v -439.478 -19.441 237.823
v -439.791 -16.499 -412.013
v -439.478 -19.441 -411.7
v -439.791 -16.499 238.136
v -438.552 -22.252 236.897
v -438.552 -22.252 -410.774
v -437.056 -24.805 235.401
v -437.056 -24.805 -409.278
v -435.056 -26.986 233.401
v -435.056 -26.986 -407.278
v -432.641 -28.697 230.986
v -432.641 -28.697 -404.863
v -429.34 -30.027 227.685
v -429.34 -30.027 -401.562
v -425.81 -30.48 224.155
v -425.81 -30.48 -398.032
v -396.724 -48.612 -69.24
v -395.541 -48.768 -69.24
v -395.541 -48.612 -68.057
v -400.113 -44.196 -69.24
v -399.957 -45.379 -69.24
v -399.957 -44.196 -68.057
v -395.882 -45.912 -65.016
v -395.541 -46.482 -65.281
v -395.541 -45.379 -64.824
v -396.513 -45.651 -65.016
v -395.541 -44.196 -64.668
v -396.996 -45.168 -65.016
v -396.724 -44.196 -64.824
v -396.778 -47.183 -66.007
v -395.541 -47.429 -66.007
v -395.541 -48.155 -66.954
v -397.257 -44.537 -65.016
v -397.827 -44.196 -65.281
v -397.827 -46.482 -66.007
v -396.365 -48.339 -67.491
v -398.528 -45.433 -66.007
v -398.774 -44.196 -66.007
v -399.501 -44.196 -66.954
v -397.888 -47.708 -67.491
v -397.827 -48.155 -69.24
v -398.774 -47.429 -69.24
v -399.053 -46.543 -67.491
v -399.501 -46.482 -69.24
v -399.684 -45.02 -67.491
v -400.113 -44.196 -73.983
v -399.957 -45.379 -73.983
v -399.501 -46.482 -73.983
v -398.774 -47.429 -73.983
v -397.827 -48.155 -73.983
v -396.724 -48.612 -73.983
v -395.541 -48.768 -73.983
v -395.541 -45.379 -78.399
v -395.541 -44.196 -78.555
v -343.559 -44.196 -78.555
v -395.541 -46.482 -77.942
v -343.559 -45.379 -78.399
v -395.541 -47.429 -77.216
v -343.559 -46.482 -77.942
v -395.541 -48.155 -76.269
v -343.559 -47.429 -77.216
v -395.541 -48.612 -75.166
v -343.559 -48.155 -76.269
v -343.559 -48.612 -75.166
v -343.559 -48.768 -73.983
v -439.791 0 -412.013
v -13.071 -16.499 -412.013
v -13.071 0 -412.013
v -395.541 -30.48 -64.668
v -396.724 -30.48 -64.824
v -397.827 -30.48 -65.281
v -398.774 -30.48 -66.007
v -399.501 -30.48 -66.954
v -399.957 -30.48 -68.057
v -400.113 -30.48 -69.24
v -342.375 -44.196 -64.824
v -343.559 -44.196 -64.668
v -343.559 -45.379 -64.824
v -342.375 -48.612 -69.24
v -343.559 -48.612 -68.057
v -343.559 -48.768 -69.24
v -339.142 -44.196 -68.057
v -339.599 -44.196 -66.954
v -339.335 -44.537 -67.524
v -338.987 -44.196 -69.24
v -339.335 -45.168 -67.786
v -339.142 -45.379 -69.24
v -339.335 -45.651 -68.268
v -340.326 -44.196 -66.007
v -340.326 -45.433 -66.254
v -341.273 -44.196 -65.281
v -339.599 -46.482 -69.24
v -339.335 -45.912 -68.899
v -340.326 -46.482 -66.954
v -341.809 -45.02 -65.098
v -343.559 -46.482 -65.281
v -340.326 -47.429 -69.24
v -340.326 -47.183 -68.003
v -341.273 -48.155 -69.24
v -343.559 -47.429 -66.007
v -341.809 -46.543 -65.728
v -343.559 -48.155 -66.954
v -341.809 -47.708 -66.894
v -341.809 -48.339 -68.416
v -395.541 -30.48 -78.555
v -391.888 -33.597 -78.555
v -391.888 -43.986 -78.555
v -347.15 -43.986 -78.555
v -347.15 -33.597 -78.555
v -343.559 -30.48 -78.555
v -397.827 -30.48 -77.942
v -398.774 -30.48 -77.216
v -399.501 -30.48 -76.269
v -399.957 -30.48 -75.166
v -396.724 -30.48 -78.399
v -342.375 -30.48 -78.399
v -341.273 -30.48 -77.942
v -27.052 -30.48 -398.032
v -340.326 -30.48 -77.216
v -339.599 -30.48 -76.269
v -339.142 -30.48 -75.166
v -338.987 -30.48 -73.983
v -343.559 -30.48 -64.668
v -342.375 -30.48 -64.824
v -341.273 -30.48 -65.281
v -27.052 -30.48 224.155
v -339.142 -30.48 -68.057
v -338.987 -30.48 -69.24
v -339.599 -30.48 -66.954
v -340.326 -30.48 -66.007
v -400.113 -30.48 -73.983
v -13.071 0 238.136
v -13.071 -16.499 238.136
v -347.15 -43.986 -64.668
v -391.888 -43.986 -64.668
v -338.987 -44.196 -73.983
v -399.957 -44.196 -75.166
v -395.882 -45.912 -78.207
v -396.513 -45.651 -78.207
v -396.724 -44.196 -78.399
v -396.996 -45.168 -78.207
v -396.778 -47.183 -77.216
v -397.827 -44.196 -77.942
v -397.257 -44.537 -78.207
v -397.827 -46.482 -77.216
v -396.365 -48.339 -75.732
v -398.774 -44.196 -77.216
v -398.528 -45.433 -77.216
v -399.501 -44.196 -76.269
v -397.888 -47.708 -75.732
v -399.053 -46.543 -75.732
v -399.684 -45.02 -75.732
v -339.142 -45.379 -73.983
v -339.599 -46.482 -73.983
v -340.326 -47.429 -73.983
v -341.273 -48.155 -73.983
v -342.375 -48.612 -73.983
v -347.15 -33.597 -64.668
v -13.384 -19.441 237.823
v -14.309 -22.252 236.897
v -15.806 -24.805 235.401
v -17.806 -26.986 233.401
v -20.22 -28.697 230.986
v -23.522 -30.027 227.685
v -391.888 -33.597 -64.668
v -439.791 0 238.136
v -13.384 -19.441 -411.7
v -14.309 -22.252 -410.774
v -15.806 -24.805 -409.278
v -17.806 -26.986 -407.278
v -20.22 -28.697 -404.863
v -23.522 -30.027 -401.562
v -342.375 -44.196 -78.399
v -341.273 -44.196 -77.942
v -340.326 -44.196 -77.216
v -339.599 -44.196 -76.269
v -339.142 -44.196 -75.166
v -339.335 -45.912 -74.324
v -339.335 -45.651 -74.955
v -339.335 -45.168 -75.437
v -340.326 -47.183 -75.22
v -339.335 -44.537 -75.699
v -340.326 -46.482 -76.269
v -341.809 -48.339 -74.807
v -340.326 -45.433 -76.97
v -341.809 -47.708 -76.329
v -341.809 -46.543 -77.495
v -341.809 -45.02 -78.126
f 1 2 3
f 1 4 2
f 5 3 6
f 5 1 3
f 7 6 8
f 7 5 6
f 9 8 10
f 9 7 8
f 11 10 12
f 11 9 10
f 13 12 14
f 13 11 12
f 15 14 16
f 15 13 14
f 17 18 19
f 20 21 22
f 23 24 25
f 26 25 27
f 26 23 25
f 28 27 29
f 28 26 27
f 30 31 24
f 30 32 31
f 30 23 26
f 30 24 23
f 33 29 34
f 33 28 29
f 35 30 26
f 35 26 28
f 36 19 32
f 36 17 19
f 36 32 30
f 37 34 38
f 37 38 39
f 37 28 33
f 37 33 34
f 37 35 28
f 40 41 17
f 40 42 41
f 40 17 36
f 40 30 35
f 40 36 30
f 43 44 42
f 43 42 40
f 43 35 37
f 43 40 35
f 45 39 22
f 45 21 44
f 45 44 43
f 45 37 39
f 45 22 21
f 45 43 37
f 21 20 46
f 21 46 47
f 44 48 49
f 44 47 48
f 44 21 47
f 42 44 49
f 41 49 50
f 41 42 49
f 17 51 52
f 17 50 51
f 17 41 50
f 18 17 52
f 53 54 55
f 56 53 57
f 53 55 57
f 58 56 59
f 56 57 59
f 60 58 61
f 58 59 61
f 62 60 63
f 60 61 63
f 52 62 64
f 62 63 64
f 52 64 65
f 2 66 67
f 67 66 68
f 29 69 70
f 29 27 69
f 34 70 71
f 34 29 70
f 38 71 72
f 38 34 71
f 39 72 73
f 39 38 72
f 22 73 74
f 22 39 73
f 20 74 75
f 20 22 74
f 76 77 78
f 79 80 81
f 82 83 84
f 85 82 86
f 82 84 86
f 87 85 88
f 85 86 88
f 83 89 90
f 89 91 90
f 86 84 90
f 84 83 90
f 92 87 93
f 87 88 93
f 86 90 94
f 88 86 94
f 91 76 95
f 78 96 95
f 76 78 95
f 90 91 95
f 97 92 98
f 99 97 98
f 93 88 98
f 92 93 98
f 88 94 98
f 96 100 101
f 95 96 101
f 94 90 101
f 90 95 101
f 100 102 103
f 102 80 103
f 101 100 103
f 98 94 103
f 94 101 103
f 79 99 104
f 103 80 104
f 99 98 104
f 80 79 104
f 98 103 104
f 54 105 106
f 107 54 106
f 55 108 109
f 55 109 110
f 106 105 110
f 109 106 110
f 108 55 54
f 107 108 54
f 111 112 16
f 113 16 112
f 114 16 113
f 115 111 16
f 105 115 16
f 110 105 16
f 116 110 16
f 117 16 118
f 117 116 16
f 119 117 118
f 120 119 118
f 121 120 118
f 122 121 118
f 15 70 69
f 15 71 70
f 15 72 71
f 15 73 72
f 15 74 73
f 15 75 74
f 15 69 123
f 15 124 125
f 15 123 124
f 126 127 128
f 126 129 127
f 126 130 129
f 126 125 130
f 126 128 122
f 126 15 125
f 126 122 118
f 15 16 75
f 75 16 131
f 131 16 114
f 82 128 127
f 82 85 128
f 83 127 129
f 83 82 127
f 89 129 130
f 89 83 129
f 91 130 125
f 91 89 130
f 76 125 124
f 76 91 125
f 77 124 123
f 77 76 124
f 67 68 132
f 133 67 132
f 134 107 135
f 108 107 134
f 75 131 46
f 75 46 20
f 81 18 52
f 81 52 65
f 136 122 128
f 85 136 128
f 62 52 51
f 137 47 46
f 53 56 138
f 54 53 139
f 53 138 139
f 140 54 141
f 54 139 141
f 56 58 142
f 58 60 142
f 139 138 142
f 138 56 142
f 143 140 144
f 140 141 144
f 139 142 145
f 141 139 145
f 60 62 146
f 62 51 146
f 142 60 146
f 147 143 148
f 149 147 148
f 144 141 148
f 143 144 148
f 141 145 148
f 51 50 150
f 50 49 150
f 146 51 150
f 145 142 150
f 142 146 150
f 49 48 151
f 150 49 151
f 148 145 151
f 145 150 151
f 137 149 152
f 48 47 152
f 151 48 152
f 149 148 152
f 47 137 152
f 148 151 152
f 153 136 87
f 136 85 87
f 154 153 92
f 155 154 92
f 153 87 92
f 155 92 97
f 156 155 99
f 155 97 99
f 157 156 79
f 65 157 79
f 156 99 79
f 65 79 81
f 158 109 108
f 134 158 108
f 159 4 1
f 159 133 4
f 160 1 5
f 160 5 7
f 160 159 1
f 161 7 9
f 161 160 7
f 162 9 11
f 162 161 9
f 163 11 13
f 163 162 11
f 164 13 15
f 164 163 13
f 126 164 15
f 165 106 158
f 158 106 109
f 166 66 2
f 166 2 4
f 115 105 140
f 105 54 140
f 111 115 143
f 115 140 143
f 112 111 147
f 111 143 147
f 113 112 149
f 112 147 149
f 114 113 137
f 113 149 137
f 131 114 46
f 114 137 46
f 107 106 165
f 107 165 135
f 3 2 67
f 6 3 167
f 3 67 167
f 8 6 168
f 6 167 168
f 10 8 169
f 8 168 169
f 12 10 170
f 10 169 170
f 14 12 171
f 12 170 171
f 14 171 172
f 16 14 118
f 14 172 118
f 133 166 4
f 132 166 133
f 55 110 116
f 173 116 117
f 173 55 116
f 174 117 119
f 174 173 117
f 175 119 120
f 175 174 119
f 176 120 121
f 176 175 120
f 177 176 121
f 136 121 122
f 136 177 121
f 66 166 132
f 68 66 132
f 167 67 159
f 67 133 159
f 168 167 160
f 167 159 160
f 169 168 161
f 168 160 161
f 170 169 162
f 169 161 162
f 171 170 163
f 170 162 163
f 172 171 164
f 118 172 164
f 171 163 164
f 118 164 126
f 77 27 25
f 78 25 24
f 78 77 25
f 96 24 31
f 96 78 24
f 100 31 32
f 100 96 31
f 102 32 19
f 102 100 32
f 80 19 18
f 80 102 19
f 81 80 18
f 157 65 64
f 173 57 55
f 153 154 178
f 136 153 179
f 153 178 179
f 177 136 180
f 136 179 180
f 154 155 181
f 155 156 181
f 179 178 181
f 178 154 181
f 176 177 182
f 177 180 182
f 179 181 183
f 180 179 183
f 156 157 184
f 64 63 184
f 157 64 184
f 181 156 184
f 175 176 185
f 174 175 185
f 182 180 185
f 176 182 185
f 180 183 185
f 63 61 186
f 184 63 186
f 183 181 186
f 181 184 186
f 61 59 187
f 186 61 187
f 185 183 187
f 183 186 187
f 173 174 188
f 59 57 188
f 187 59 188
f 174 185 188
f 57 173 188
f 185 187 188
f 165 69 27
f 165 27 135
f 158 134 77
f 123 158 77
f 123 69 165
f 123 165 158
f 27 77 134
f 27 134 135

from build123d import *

# Parameters (mm, degrees)
F0_W     = 426.72
F0_H     = 650.148946
F1_DEPTH = 30.48
F2_R     = 13.981194
F3_W     = 61.12656
F3_H     = 13.886399
F4_DEPTH = 18.288
F5_W     = 44.737935
F5_H     = 10.388609
F6_DEPTH = 39.0144
F7_R     = 4.572


with BuildPart() as f1:
    # F0 (on Front) → F1 (new body)
    with BuildSketch(Plane.XZ):
        with Locations((-226.430792, -86.938575)):
            Rectangle(F0_W, F0_H)
    extrude(amount=F1_DEPTH)

    # F2
    f2_edges = [f1.edges().sort_by_distance(p)[0] for p in [
        (-439.790792, -30.48, -86.938575),
        (-226.430792, -30.48, 238.135898),
        (-13.070792, -30.48, -86.938575),
        (-226.430792, -30.48, -412.013048),
    ]]
    fillet(f2_edges, radius=F2_R)

    # F3 (on face) → F4 (join)
    with BuildSketch(Plane.XZ.offset(30.48)):
        with Locations((-369.549796, -71.611527)):
            Rectangle(F3_W, F3_H)
    extrude(amount=F4_DEPTH)

    # F5 (on face) → F6 (cut)
    with BuildSketch(Plane(origin=(0, 0, -78.554727), x_dir=(1, 0, 0), z_dir=(0, 0, -1))):
        with Locations((-369.519263, 38.791405)):
            Rectangle(F5_W, F5_H)
    extrude(amount=-F6_DEPTH, mode=Mode.SUBTRACT)

    # F7
    f7_edges = [f1.edges().sort_by_distance(p)[0] for p in [
        (-400.113076, -48.768, -71.611527),
        (-369.549796, -48.768, -64.668328),
        (-369.549796, -48.768, -78.554727),
        (-338.986516, -39.624, -64.668328),
        (-338.986516, -48.768, -71.611527),
        (-338.986516, -39.624, -78.554727),
        (-400.113076, -39.624, -78.554727),
        (-400.113076, -39.624, -64.668328),
    ]]
    fillet(f7_edges, radius=F7_R)


solid = f1.part
